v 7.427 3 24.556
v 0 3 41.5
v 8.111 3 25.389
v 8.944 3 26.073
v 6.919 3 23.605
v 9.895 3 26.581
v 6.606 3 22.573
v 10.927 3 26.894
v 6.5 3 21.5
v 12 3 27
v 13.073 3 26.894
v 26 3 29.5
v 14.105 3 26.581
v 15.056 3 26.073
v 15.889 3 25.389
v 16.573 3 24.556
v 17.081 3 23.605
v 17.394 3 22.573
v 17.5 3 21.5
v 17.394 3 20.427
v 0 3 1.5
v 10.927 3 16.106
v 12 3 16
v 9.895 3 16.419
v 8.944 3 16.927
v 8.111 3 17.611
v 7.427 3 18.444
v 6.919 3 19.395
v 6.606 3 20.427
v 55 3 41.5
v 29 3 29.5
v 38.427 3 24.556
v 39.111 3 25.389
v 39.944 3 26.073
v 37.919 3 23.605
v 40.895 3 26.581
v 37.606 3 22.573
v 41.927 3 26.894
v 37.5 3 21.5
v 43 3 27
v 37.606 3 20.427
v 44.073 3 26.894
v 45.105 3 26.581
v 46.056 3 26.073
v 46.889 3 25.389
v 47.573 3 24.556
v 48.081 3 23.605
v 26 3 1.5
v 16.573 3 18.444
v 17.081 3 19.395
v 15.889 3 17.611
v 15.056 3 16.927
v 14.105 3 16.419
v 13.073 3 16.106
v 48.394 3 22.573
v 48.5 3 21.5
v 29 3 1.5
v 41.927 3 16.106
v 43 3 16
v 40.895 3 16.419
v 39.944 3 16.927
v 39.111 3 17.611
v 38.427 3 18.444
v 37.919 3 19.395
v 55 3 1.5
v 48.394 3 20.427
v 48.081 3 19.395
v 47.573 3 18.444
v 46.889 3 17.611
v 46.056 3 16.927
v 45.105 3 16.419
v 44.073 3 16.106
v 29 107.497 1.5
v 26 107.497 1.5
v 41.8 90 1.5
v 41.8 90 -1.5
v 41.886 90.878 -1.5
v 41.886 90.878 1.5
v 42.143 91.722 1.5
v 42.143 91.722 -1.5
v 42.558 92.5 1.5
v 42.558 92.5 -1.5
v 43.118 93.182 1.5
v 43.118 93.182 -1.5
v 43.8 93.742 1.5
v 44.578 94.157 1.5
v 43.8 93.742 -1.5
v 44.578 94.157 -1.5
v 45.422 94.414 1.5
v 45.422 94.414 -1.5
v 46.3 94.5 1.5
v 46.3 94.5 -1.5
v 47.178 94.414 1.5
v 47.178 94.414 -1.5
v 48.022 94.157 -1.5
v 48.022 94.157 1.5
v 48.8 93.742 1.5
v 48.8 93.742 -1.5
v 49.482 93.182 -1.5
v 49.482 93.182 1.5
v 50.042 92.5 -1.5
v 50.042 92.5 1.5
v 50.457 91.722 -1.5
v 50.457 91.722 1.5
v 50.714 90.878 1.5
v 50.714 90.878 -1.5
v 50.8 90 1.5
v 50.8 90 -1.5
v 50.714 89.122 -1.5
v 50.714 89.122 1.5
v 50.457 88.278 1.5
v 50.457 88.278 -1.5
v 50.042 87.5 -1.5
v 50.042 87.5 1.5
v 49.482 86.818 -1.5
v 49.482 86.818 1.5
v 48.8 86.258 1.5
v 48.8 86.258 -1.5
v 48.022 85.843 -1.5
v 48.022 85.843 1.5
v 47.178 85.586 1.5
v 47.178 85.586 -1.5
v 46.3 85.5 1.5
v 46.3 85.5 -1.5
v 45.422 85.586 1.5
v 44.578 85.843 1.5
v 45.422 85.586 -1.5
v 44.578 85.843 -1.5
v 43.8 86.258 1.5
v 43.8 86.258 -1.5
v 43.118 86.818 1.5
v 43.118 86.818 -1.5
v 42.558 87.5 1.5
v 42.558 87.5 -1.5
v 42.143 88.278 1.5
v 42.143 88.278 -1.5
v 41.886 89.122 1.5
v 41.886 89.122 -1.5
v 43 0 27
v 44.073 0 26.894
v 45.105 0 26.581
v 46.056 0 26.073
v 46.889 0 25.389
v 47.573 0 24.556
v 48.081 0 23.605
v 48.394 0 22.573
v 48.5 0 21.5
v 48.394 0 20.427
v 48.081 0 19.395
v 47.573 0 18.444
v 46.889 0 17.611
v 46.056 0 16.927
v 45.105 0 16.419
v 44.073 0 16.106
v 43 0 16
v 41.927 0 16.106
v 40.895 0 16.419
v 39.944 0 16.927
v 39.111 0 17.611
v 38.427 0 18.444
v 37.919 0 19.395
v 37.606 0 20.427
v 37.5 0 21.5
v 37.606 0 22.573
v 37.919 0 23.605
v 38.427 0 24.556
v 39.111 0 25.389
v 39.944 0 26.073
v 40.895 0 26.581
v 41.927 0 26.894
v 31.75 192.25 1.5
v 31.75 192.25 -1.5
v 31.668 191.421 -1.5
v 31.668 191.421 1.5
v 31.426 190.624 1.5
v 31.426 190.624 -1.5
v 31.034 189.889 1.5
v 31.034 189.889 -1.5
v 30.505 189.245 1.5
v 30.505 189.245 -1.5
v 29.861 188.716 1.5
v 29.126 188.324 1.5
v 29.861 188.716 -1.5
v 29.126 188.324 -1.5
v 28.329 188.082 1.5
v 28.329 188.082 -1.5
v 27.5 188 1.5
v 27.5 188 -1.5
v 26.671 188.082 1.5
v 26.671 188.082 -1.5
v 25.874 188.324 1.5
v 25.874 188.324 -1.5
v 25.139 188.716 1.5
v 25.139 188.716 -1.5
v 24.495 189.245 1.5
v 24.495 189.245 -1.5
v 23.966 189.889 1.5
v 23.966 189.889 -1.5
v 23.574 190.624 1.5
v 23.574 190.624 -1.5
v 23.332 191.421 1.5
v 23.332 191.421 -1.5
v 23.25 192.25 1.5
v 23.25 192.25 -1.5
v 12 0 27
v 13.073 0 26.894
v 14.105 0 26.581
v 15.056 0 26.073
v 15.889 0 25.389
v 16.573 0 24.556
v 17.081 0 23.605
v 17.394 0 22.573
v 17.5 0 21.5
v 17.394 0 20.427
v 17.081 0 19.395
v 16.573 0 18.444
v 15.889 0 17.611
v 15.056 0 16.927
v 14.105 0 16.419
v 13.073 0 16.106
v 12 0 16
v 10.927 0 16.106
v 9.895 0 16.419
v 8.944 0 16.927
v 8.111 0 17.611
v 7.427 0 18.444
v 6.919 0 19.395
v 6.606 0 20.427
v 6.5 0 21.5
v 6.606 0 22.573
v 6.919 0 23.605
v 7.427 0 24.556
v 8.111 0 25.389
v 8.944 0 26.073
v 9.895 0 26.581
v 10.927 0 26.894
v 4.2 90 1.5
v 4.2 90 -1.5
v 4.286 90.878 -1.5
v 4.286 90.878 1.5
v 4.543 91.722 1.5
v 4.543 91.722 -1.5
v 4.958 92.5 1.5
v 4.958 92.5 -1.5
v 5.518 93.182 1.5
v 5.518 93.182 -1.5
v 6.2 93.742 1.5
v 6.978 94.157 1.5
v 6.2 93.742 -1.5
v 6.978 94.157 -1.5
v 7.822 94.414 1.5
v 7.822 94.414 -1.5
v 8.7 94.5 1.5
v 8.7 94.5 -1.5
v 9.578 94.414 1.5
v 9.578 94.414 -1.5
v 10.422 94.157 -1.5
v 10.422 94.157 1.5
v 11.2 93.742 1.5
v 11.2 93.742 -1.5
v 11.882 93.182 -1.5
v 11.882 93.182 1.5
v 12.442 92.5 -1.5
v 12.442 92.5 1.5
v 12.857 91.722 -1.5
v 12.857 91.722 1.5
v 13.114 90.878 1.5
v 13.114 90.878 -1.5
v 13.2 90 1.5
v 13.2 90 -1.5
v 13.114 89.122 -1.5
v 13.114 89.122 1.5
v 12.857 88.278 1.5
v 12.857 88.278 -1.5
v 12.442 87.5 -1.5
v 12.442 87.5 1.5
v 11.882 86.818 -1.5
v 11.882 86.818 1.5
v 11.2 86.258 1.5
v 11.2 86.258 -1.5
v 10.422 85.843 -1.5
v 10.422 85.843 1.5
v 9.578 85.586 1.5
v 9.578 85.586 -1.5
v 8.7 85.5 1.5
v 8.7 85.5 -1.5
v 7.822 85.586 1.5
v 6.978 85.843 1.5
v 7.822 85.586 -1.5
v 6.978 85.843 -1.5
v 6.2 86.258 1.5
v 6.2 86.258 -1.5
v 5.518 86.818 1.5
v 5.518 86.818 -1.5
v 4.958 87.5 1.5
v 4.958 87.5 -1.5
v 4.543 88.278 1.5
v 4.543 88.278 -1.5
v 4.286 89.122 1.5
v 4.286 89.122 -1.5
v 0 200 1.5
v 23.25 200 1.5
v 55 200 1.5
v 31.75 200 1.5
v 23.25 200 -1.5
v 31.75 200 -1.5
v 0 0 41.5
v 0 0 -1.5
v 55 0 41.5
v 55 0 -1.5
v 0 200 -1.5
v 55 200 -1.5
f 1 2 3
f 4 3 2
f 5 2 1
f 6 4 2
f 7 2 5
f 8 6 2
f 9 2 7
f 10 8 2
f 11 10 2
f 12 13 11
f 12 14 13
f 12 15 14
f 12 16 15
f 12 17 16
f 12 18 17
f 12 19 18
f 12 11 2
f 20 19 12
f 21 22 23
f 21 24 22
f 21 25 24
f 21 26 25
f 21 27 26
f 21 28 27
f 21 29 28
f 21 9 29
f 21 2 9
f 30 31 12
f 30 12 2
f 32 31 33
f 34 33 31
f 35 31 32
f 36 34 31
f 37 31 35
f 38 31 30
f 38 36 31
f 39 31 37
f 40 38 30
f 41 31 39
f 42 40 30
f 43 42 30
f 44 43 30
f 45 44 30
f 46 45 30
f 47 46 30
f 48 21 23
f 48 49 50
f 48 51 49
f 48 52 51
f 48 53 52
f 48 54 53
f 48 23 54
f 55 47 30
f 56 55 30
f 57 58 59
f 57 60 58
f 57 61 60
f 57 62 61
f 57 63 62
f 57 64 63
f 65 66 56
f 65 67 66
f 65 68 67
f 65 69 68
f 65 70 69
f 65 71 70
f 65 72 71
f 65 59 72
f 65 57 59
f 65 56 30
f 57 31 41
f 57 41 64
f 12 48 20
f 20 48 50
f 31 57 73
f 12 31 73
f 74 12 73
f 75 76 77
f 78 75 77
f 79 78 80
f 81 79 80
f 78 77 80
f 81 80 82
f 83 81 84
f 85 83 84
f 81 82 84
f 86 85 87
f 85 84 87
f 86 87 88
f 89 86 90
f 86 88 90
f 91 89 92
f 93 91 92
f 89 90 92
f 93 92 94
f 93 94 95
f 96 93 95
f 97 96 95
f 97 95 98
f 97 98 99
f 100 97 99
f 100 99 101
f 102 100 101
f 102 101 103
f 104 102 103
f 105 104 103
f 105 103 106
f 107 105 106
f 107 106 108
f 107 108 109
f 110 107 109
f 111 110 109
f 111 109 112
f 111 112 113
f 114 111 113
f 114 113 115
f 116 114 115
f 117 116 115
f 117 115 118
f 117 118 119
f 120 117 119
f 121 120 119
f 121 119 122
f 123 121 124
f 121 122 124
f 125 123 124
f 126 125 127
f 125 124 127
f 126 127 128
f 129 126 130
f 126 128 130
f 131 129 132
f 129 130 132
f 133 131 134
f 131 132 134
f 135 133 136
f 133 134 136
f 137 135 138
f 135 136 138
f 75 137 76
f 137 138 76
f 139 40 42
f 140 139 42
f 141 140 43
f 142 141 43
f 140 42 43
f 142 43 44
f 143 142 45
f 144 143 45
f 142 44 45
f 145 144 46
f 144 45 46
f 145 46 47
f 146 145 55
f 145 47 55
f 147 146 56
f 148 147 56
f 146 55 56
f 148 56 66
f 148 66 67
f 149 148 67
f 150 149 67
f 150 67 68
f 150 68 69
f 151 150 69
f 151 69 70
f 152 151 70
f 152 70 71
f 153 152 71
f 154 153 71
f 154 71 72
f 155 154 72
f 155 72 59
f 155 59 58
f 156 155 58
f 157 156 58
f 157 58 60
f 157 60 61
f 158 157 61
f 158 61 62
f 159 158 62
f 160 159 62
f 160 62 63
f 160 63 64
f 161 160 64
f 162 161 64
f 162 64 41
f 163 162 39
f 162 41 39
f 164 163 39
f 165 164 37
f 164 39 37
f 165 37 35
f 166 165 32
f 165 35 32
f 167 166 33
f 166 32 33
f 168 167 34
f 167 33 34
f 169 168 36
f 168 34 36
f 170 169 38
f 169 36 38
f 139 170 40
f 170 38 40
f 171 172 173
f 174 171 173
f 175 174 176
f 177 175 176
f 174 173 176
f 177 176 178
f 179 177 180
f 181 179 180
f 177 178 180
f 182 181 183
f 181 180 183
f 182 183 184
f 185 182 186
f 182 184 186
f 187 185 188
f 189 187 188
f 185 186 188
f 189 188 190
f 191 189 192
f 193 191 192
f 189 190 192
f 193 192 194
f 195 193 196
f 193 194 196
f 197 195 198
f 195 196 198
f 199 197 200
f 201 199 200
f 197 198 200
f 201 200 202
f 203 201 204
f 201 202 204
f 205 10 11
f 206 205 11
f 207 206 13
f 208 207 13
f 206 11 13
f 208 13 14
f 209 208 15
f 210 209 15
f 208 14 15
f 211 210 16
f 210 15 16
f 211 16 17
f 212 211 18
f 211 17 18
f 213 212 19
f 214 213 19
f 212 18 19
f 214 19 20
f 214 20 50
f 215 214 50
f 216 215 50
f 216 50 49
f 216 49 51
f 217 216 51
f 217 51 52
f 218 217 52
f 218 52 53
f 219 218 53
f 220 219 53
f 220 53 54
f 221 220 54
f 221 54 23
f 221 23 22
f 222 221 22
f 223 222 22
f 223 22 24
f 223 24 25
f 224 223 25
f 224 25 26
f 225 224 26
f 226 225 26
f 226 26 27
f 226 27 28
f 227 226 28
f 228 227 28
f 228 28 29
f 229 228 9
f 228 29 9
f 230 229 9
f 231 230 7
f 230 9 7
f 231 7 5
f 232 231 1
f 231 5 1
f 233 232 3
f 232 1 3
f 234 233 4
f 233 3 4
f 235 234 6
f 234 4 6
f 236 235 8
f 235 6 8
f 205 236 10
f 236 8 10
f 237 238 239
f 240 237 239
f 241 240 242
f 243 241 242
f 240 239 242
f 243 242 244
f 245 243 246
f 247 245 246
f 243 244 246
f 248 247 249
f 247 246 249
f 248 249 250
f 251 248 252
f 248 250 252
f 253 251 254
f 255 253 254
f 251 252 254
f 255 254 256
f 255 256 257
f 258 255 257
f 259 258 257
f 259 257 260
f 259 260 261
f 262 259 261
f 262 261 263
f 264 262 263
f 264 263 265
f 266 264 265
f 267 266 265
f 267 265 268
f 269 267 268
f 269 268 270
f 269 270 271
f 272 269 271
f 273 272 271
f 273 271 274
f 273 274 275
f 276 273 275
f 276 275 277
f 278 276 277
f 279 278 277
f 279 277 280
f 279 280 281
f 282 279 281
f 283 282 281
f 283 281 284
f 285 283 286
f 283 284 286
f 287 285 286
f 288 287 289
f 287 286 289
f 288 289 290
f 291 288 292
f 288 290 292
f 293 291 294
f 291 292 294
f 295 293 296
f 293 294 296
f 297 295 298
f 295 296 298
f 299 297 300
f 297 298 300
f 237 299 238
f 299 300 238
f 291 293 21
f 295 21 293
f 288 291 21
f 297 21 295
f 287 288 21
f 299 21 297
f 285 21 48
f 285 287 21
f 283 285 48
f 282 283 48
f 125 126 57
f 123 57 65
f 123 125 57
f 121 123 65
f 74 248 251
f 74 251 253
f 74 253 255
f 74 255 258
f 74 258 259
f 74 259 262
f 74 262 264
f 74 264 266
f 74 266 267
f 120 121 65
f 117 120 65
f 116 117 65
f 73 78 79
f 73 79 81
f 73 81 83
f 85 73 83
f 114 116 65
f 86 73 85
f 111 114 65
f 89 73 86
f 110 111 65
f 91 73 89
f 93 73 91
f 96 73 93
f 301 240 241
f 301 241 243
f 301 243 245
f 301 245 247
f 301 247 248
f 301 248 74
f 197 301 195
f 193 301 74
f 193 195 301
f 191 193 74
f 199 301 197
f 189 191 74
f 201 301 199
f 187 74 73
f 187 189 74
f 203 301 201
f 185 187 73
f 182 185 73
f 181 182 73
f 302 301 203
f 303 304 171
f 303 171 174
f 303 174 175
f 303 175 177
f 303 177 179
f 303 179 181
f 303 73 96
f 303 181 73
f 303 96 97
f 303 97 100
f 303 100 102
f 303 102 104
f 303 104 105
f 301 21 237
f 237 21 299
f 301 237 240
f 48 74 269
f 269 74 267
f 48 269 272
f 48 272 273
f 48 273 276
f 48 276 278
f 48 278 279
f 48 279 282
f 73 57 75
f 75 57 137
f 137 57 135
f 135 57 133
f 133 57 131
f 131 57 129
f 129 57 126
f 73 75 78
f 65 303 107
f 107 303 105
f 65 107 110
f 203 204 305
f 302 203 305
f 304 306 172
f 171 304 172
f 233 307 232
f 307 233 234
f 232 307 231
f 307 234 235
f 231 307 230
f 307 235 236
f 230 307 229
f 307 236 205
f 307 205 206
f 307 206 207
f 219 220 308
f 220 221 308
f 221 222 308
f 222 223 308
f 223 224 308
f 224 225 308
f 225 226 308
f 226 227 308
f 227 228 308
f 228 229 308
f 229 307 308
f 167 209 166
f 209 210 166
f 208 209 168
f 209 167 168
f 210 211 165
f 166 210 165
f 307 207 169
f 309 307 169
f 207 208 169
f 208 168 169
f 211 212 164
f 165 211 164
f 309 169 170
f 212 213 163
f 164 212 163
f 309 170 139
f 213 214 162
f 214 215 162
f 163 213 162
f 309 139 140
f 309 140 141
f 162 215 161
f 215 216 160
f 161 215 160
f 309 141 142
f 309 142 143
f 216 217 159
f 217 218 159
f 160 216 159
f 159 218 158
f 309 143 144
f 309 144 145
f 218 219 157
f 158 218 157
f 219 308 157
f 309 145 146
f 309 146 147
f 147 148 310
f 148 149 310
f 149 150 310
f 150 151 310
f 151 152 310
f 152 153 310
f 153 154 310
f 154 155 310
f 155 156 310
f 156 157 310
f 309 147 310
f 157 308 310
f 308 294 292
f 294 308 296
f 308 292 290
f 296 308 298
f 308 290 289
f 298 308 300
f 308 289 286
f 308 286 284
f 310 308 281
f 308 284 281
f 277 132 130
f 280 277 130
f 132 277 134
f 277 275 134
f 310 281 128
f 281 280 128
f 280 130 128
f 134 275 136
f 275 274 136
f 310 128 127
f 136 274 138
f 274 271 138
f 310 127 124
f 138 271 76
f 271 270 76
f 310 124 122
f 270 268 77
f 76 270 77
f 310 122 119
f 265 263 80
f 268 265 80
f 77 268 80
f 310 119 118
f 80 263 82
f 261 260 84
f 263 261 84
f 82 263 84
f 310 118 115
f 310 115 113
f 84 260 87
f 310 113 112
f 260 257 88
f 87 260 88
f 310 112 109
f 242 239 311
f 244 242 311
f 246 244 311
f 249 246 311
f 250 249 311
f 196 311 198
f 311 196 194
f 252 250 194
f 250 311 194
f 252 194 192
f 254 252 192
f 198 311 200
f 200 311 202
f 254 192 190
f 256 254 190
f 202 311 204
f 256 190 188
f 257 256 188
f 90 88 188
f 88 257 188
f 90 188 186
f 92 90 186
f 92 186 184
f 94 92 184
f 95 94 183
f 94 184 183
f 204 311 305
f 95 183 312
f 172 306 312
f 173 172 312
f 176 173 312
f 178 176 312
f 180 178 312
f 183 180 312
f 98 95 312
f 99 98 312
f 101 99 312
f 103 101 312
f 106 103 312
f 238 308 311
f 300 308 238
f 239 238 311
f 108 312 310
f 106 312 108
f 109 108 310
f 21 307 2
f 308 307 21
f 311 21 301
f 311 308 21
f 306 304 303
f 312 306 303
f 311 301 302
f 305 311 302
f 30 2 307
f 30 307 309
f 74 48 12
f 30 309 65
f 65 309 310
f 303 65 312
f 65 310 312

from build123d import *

# Parameters (mm, degrees)
SZKIC1_W                    = 55
SZKIC1_H                    = 200
DODANIE_WYCI_GNI_CIE1_DEPTH = 1.5
SZKIC2_W                    = 55
SZKIC2_H                    = 3
DODANIE_WYCI_GNI_CIE2_DEPTH = 40
SZKIC3_R                    = 5.5
WYTNIJ_WYCI_GNI_CIE1_DEPTH  = 20
DODANIE_WYCI_GNI_CIE3_DEPTH = 1.5
SZKIC5_R                    = 4.5
WYTNIJ_WYCI_GNI_CIE3_DEPTH  = 212.834841327


with BuildPart() as part:
    # Szkic1 → Dodanie-wyciągnięcie1 (new, symmetric)
    with BuildSketch(Plane.XY):
        with Locations((27.5, 100)):
            Rectangle(SZKIC1_W, SZKIC1_H)
    extrude(amount=DODANIE_WYCI_GNI_CIE1_DEPTH, both=True)



with BuildPart() as body_2:
    # Szkic2 → Dodanie-wyciągnięcie2 (new body)
    with BuildSketch(Plane.XY.offset(1.5)):
        with Locations((27.5, 1.5)):
            Rectangle(SZKIC2_W, SZKIC2_H)
    extrude(amount=DODANIE_WYCI_GNI_CIE2_DEPTH)

    # Szkic3 → Wytnij-wyciągnięcie1 (cut)
    with BuildSketch(Plane(origin=(0, 3, 0), x_dir=(1, 0, 0), z_dir=(0, 1, 0))):
        with Locations(Location((12, -21.5, 0), (0, 0, 270))):
            Circle(SZKIC3_R)
        with Locations(Location((43, -21.5, 0), (0, 0, 270))):
            Circle(SZKIC3_R)
    extrude(amount=-WYTNIJ_WYCI_GNI_CIE1_DEPTH, mode=Mode.SUBTRACT)


with BuildPart() as part_1:
    add(part.part)

    add(body_2.part)  # Dodanie-wyciągnięcie3 merges body 2
    # Szkic4 → Dodanie-wyciągnięcie3 (add, symmetric)
    with BuildSketch(Plane(origin=(27.5, 0, 0), x_dir=(0, 0, -1), z_dir=(1, 0, 0))):
        Polygon((-29.5, 3), (-1.5, 107.497422612), (-1.5, 3), align=None)
    extrude(amount=DODANIE_WYCI_GNI_CIE3_DEPTH, both=True)

    # Szkic5 → Wytnij-wyciągnięcie3 (cut, through all)
    with BuildSketch(Plane(origin=(0, 0, -1.5), x_dir=(-1, 0, 0), z_dir=(0, 0, -1))):
        with Locations((-8.7, 90)):
            Circle(SZKIC5_R)
        with Locations((-46.3, 90)):
            Circle(SZKIC5_R)
        with BuildLine():
            Line((-31.75, 200), (-31.75, 192.25))
            ThreePointArc((-31.75, 192.25), (-27.5, 188), (-23.25, 192.25))
            Line((-23.25, 192.25), (-23.25, 200))
            Line((-23.25, 200), (-31.75, 200))
        make_face()
    extrude(amount=-WYTNIJ_WYCI_GNI_CIE3_DEPTH, mode=Mode.SUBTRACT)


solid = part_1.part
